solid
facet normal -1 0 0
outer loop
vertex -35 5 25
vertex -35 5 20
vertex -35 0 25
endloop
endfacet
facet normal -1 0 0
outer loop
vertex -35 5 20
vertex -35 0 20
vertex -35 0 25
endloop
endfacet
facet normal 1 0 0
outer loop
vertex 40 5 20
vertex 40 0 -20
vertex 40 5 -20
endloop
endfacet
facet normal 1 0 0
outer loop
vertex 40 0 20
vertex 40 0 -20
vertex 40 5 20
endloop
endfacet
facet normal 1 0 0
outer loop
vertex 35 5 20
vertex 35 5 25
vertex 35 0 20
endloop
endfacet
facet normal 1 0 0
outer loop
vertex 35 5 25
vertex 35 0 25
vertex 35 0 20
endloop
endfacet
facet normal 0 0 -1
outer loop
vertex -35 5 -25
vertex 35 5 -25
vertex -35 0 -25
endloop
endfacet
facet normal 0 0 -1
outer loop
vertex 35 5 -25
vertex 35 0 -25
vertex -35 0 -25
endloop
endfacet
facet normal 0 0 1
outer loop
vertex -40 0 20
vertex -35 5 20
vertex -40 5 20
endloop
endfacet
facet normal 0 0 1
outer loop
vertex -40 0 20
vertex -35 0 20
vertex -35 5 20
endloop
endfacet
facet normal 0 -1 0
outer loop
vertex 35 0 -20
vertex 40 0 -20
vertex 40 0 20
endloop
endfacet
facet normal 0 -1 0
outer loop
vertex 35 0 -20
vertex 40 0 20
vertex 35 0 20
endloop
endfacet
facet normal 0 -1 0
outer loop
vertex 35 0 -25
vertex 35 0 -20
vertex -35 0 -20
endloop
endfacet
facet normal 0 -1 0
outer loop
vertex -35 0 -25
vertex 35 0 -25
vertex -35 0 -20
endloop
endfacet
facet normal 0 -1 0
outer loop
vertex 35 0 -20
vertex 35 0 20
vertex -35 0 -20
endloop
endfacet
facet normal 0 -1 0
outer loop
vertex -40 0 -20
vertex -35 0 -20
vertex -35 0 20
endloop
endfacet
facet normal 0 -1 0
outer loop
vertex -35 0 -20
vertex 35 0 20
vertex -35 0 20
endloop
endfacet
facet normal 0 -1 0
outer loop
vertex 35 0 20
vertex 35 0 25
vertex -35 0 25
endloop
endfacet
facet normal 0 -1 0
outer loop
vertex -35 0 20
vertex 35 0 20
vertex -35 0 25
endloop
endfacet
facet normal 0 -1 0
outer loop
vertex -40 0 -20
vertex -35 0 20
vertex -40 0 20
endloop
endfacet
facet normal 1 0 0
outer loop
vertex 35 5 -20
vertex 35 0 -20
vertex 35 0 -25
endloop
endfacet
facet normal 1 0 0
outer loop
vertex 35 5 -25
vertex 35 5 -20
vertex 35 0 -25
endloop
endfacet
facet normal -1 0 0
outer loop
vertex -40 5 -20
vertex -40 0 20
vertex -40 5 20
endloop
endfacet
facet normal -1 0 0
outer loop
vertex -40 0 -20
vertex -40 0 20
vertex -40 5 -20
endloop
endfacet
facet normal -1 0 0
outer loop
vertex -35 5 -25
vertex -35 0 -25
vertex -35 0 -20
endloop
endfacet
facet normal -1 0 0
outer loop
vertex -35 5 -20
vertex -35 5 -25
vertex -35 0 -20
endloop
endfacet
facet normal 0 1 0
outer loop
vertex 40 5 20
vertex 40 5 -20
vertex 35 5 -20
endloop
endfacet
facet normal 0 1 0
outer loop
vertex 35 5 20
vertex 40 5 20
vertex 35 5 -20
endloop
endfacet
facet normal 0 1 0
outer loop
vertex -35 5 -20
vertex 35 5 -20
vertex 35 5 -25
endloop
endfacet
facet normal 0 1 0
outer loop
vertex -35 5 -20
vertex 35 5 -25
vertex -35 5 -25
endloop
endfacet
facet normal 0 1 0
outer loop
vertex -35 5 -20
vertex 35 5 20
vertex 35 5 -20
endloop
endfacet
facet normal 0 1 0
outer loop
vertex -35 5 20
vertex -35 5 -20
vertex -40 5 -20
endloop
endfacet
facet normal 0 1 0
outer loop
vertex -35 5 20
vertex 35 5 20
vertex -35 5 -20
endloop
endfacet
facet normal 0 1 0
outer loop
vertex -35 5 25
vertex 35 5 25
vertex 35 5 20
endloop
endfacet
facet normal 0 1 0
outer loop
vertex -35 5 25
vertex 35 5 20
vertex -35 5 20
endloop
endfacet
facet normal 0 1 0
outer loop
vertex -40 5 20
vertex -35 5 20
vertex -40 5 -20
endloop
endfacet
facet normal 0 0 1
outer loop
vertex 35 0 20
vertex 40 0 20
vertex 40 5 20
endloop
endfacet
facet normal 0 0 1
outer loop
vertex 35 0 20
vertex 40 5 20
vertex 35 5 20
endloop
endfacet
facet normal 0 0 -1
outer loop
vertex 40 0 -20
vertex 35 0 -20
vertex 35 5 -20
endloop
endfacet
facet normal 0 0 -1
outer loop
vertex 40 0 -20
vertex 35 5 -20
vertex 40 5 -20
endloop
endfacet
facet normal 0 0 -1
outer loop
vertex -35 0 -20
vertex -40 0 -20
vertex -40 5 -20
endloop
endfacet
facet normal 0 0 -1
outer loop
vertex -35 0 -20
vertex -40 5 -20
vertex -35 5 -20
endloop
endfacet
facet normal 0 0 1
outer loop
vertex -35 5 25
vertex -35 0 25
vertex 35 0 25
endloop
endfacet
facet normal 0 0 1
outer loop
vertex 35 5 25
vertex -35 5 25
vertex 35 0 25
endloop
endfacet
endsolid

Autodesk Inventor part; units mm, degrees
ref_plane "YZ Plane" through (0, 0, 0) normal (1, 0, 0) x (0, 1, 0)
ref_plane "XZ Plane" through (0, 0, 0) normal (0, 1, 0) x (-1, 0, 0)
ref_plane "XY Plane" through (0, 0, 0) normal (0, 0, 1) x (1, 0, 0)
sketch "Sketch1" plane through (0, 0, 0) normal (0, 1, 0) x (-1, 0, 0)
  line L0 (35, 25) -> (-35, 25)
  line L1 (-35, 25) -> (-35, -25)
  line L2 (-35, -25) -> (35, -25)
  line L3 (35, -25) -> (35, 25)
  line L4 (35, 25) -> (-35, -25) construction
  line L5 (-35, 25) -> (35, -25) construction
  line L6 (40, -20) -> (35, -20)
  line L7 (35, -20) -> (35, 20)
  line L8 (35, 20) -> (40, 20)
  line L9 (40, 20) -> (40, -20)
  line L10 (40, -20) -> (35, 20) construction
  line L11 (35, -20) -> (40, 20) construction
  line L12 (-35, -20) -> (-40, -20)
  line L13 (-40, -20) -> (-40, 20)
  line L14 (-40, 20) -> (-35, 20)
  line L15 (-35, 20) -> (-35, -20)
  line L16 (-35, -20) -> (-40, 20) construction
  line L17 (-40, -20) -> (-35, 20) construction
  line L18 (35, 0) -> (0, 0)
  line L19 (37.5, 0) -> (40, 0) construction
  line L20 (-37.5, 0) -> (-35, 0) construction
  point P0 (35, -20)
  point P1 (-35, 20)
  point P2 (-35, -20)
  dimension "d0" = 5
  dimension "d1" = 5
  dimension "d2" = 40
  dimension "d3" = 50
  dimension "d4" = 40
  dimension "d5" = 70
extrude "Extrusion1" add sketch "Sketch1" along normal blind 5
properties part number "Moving Carousel Wall"
